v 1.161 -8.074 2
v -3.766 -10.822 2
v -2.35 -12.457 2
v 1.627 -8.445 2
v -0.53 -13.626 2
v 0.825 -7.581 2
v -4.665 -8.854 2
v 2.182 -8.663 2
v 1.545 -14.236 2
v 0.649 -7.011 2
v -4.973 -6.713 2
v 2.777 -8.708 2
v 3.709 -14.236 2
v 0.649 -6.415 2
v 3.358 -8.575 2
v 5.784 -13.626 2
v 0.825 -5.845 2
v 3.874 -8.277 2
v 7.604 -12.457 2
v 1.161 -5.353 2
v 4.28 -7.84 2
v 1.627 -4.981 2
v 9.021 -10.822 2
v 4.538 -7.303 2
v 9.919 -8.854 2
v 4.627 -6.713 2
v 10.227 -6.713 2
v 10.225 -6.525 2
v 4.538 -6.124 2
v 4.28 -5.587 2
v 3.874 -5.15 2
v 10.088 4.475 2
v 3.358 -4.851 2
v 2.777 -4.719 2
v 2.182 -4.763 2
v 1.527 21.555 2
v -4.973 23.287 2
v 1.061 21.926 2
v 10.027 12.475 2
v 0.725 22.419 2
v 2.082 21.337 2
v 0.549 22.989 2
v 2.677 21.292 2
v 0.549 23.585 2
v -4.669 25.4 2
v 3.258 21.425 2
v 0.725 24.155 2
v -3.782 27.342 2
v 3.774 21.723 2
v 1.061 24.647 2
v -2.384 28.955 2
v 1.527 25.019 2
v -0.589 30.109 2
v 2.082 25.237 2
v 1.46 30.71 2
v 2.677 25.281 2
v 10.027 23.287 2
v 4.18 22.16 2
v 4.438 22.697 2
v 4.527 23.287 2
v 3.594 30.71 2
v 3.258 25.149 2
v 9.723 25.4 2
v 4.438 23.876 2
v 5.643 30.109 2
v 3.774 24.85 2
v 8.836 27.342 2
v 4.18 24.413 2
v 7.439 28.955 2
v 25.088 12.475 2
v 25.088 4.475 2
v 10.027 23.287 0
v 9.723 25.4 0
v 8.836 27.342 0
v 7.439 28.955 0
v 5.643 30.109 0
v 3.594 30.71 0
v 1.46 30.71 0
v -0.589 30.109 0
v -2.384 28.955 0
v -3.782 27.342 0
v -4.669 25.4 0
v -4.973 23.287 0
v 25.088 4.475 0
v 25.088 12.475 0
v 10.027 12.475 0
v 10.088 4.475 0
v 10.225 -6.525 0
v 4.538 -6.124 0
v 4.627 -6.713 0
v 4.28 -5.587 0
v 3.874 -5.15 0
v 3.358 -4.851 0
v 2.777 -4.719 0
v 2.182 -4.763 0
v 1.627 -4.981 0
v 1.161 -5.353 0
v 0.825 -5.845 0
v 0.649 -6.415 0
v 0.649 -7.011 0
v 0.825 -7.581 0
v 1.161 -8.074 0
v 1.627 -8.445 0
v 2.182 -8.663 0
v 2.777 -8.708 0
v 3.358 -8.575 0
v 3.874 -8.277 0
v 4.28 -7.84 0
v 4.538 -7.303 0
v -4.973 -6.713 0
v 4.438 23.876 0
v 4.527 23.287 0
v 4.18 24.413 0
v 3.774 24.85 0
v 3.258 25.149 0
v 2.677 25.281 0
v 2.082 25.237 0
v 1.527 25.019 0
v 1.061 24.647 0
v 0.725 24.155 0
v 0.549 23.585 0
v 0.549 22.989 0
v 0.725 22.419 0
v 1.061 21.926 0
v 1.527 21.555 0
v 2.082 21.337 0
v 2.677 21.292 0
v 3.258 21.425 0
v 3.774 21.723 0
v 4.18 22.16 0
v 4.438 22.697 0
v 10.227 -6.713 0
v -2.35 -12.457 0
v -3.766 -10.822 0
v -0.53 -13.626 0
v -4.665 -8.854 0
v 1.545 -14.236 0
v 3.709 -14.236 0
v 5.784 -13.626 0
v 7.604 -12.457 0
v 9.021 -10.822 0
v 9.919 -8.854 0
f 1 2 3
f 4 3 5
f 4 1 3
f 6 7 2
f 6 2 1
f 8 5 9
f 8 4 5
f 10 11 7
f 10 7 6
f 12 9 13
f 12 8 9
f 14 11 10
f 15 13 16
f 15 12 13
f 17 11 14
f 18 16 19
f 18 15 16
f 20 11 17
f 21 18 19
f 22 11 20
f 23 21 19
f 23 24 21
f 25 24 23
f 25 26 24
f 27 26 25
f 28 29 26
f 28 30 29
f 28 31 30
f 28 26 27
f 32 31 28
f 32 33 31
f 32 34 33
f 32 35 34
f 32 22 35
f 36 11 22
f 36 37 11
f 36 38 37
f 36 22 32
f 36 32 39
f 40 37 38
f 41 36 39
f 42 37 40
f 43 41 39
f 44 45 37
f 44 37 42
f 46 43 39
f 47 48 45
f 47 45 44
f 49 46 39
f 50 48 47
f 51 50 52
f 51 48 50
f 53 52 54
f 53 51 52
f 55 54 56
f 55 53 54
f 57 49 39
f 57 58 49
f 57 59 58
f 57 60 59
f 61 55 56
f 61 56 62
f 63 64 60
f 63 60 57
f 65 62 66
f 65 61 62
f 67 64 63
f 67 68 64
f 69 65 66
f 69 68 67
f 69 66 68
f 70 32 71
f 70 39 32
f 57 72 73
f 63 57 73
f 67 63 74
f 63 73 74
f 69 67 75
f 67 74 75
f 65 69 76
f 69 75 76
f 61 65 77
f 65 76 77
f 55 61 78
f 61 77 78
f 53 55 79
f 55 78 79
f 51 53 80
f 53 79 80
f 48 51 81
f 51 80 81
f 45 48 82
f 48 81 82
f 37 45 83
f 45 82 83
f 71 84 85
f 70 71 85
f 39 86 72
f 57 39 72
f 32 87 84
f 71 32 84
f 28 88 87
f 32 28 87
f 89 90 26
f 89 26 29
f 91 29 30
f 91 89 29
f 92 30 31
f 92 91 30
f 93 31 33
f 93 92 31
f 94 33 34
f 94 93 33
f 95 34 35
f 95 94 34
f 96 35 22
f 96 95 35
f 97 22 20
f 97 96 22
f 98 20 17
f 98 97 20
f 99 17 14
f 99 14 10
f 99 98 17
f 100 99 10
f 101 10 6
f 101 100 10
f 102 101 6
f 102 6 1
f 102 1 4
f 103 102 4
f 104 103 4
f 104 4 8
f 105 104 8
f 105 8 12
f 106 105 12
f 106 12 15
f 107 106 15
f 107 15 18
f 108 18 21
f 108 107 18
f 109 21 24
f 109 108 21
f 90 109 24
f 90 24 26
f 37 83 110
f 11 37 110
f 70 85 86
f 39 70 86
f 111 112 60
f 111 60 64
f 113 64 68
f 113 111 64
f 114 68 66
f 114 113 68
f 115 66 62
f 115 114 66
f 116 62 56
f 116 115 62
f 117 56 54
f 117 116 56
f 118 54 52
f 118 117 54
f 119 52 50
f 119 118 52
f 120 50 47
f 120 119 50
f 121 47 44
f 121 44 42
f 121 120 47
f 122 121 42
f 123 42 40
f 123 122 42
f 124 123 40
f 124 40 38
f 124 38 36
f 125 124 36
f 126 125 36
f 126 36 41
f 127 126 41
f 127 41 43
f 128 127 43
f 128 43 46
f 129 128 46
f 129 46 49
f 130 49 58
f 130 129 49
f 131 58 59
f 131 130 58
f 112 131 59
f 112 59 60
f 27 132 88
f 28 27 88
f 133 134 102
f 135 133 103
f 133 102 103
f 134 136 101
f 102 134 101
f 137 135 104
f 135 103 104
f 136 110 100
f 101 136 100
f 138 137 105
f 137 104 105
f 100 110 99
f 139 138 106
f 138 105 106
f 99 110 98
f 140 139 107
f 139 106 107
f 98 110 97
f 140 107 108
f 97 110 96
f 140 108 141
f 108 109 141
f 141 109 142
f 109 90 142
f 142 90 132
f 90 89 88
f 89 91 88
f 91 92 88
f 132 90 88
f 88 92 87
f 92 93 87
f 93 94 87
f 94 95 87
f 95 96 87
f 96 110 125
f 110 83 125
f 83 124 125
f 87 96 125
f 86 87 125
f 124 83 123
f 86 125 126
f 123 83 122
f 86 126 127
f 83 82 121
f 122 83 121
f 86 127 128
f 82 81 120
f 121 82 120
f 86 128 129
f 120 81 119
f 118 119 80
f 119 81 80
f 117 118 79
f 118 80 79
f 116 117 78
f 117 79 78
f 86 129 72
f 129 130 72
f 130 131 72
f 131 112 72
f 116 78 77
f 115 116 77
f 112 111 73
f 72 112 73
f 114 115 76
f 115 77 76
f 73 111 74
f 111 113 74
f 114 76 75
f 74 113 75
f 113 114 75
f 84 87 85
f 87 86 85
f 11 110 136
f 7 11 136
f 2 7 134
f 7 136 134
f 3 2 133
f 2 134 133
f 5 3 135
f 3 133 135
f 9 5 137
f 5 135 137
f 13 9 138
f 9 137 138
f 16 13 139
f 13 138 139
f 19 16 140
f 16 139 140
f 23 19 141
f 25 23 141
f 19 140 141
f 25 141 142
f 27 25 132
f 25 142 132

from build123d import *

# Parameters (mm, degrees)
SKETCH1_R           = 2
BOSS_EXTRUDE1_DEPTH = 2


with BuildPart() as part:
    # Sketch1 → Boss-Extrude1 (new body)
    with BuildSketch(Plane.XY):
        with BuildLine():
            Line((10.224721825, -6.524941173), (10.088449683, 4.475058827))
            Line((10.088449683, 4.475058827), (25.088449683, 4.475058827))
            Line((25.088449683, 4.475058827), (25.088449683, 12.475058827))
            Line((25.088449683, 12.475058827), (10.027054239, 12.475058827))
            Line((10.027054239, 12.475058827), (10.027054239, 23.2867844))
            ThreePointArc((10.027054239, 23.2867844), (2.527054239, 30.7867844), (-4.972945761, 23.2867844))
            Line((-4.972945761, 23.2867844), (-4.972945761, -6.7132156))
            ThreePointArc((-4.972945761, -6.7132156), (2.627054239, -14.3132156), (10.227054239, -6.7132156))
            Line((10.227054239, -6.7132156), (10.224721825, -6.524941173))
        make_face()
        with Locations((2.627054239, -6.7132156)):
            Circle(SKETCH1_R, mode=Mode.SUBTRACT)
        with Locations((2.527054239, 23.2867844)):
            Circle(SKETCH1_R, mode=Mode.SUBTRACT)
    extrude(amount=BOSS_EXTRUDE1_DEPTH)


solid = part.part
